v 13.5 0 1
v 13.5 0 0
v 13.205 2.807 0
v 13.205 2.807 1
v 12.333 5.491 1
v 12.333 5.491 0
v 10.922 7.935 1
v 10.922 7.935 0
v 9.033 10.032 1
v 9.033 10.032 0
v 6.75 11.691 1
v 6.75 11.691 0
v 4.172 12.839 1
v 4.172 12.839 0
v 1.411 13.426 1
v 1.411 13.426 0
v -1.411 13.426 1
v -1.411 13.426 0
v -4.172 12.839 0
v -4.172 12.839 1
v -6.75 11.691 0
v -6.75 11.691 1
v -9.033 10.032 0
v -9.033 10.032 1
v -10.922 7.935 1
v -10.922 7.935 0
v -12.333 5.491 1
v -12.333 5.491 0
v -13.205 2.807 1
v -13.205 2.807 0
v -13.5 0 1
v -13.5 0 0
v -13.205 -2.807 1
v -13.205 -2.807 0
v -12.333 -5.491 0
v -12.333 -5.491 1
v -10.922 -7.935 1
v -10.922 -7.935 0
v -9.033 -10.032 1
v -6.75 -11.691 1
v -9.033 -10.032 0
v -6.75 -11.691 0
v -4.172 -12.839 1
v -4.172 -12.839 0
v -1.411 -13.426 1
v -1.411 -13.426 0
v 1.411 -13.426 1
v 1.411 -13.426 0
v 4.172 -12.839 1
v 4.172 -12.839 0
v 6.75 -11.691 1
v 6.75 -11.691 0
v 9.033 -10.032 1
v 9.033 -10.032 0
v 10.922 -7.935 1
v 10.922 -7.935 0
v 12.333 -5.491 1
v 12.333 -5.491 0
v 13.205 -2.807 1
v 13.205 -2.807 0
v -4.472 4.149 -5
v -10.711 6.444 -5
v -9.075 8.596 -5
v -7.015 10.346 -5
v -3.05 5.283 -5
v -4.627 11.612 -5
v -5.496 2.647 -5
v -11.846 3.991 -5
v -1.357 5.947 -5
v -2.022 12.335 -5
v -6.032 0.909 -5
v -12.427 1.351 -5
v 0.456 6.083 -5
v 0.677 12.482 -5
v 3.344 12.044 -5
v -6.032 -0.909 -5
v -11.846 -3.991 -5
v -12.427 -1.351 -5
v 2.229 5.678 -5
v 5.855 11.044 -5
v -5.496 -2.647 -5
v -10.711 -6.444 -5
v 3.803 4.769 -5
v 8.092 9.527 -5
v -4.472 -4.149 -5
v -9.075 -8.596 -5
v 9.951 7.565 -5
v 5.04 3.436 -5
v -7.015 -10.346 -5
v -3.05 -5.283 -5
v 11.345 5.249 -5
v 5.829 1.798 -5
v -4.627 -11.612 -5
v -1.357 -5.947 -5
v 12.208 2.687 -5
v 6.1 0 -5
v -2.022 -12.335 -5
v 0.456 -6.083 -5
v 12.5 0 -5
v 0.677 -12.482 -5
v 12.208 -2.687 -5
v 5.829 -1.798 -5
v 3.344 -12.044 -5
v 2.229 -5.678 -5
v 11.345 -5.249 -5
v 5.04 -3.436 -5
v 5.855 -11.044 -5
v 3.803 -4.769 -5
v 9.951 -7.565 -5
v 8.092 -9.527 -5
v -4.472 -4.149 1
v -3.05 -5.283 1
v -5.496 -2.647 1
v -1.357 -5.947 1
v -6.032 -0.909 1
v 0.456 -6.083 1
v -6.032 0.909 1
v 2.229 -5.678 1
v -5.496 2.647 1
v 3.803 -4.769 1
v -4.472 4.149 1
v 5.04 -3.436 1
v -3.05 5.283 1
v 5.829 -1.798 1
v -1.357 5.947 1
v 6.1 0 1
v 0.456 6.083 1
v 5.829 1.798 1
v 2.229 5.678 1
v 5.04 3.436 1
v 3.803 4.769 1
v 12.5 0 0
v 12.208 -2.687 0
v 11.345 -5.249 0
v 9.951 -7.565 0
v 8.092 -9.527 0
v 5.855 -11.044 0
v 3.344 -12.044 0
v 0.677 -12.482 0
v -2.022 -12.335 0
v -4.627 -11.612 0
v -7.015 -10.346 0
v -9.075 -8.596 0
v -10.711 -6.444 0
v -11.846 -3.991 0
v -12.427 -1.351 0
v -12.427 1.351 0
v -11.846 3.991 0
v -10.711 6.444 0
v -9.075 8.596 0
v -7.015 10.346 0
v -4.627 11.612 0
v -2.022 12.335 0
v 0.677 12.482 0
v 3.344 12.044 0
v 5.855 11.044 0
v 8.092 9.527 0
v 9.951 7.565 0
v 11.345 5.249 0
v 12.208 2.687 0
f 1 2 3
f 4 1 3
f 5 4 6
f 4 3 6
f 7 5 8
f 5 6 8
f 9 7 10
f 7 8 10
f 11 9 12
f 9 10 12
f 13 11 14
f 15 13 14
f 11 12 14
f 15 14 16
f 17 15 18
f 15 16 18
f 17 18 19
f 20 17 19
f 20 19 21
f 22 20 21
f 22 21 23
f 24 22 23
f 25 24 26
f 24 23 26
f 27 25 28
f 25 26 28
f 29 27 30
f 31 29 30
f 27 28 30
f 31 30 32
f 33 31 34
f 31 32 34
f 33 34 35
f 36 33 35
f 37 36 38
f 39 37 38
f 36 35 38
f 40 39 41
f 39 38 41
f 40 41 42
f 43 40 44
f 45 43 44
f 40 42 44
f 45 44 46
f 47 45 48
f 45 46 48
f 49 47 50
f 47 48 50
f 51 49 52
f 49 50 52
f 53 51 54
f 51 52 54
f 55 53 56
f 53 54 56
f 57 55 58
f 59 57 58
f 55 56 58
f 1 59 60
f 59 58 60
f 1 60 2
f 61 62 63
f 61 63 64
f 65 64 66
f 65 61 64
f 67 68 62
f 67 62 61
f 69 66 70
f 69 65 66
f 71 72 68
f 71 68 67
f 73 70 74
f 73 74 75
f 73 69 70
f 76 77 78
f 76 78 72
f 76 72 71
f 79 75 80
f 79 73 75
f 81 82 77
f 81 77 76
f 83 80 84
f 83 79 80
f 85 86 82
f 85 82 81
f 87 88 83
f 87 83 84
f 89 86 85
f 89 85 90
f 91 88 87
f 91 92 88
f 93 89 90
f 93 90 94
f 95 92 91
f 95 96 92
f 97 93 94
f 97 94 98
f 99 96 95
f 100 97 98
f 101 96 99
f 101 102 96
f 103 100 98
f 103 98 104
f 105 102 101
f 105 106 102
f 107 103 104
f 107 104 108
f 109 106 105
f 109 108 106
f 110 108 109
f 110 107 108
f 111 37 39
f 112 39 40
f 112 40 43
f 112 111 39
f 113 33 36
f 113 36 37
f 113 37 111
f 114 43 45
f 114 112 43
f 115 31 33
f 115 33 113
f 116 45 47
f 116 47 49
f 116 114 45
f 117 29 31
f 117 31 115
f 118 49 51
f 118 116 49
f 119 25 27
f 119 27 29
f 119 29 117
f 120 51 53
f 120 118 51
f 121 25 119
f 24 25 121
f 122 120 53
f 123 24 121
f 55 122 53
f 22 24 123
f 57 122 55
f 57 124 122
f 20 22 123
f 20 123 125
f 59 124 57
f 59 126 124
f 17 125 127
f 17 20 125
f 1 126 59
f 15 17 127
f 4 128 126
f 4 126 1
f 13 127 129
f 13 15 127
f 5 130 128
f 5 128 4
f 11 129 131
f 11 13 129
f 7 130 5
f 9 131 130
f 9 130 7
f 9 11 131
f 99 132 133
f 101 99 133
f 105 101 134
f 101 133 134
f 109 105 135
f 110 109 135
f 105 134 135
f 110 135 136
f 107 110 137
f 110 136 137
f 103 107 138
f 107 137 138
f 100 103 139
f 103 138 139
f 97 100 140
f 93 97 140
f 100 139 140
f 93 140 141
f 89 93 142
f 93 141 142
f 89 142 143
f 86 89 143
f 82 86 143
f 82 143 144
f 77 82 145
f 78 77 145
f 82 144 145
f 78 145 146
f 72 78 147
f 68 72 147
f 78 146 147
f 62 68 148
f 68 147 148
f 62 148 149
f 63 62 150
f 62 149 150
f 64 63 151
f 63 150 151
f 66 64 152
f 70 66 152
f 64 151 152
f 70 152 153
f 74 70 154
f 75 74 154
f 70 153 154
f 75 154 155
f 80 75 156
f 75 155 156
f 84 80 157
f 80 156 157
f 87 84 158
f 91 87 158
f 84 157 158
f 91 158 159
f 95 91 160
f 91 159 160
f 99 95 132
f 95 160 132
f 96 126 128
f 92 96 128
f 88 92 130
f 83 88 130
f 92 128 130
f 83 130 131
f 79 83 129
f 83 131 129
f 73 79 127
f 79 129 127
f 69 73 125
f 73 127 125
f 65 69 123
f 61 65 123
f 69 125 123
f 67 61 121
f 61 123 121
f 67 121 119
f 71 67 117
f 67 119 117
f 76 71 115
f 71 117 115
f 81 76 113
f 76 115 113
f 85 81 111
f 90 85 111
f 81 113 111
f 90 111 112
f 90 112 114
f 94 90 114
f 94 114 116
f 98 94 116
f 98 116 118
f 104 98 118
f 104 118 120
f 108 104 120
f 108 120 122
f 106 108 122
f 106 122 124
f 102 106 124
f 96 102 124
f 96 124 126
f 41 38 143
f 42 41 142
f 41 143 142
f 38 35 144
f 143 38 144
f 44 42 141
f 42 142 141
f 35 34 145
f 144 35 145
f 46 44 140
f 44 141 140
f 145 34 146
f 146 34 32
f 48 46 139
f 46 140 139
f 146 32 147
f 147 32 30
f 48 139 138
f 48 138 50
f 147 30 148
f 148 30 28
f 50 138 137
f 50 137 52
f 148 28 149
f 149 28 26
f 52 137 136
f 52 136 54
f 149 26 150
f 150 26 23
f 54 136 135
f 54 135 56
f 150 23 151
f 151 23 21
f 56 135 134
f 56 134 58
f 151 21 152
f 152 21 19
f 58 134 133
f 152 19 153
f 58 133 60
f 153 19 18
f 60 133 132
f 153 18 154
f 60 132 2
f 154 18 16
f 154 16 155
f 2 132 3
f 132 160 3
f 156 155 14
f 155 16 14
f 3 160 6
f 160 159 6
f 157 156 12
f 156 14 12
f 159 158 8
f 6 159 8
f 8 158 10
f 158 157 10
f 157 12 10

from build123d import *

# Parameters (mm, degrees)
F0_R     = 13.5
F1_DEPTH = 1
F2_R     = 12.5
F3_DEPTH = 5
F4_R     = 6.1
F5_DEPTH = 6.001


with BuildPart() as f1:
    # F0 (on Top) → F1 (new body)
    with BuildSketch(Plane.XY):
        Circle(F0_R)
    extrude(amount=F1_DEPTH)

    # F2 (on face) → F3 (join)
    with BuildSketch(Plane(origin=(0, 0, 0), x_dir=(1, 0, 0), z_dir=(0, 0, -1))):
        Circle(F2_R)
    extrude(amount=F3_DEPTH)

    # F4 (on face) → F5 (cut, through all)
    with BuildSketch(Plane.XY.offset(1)):
        Circle(F4_R)
    extrude(amount=-F5_DEPTH, mode=Mode.SUBTRACT)


solid = f1.part
